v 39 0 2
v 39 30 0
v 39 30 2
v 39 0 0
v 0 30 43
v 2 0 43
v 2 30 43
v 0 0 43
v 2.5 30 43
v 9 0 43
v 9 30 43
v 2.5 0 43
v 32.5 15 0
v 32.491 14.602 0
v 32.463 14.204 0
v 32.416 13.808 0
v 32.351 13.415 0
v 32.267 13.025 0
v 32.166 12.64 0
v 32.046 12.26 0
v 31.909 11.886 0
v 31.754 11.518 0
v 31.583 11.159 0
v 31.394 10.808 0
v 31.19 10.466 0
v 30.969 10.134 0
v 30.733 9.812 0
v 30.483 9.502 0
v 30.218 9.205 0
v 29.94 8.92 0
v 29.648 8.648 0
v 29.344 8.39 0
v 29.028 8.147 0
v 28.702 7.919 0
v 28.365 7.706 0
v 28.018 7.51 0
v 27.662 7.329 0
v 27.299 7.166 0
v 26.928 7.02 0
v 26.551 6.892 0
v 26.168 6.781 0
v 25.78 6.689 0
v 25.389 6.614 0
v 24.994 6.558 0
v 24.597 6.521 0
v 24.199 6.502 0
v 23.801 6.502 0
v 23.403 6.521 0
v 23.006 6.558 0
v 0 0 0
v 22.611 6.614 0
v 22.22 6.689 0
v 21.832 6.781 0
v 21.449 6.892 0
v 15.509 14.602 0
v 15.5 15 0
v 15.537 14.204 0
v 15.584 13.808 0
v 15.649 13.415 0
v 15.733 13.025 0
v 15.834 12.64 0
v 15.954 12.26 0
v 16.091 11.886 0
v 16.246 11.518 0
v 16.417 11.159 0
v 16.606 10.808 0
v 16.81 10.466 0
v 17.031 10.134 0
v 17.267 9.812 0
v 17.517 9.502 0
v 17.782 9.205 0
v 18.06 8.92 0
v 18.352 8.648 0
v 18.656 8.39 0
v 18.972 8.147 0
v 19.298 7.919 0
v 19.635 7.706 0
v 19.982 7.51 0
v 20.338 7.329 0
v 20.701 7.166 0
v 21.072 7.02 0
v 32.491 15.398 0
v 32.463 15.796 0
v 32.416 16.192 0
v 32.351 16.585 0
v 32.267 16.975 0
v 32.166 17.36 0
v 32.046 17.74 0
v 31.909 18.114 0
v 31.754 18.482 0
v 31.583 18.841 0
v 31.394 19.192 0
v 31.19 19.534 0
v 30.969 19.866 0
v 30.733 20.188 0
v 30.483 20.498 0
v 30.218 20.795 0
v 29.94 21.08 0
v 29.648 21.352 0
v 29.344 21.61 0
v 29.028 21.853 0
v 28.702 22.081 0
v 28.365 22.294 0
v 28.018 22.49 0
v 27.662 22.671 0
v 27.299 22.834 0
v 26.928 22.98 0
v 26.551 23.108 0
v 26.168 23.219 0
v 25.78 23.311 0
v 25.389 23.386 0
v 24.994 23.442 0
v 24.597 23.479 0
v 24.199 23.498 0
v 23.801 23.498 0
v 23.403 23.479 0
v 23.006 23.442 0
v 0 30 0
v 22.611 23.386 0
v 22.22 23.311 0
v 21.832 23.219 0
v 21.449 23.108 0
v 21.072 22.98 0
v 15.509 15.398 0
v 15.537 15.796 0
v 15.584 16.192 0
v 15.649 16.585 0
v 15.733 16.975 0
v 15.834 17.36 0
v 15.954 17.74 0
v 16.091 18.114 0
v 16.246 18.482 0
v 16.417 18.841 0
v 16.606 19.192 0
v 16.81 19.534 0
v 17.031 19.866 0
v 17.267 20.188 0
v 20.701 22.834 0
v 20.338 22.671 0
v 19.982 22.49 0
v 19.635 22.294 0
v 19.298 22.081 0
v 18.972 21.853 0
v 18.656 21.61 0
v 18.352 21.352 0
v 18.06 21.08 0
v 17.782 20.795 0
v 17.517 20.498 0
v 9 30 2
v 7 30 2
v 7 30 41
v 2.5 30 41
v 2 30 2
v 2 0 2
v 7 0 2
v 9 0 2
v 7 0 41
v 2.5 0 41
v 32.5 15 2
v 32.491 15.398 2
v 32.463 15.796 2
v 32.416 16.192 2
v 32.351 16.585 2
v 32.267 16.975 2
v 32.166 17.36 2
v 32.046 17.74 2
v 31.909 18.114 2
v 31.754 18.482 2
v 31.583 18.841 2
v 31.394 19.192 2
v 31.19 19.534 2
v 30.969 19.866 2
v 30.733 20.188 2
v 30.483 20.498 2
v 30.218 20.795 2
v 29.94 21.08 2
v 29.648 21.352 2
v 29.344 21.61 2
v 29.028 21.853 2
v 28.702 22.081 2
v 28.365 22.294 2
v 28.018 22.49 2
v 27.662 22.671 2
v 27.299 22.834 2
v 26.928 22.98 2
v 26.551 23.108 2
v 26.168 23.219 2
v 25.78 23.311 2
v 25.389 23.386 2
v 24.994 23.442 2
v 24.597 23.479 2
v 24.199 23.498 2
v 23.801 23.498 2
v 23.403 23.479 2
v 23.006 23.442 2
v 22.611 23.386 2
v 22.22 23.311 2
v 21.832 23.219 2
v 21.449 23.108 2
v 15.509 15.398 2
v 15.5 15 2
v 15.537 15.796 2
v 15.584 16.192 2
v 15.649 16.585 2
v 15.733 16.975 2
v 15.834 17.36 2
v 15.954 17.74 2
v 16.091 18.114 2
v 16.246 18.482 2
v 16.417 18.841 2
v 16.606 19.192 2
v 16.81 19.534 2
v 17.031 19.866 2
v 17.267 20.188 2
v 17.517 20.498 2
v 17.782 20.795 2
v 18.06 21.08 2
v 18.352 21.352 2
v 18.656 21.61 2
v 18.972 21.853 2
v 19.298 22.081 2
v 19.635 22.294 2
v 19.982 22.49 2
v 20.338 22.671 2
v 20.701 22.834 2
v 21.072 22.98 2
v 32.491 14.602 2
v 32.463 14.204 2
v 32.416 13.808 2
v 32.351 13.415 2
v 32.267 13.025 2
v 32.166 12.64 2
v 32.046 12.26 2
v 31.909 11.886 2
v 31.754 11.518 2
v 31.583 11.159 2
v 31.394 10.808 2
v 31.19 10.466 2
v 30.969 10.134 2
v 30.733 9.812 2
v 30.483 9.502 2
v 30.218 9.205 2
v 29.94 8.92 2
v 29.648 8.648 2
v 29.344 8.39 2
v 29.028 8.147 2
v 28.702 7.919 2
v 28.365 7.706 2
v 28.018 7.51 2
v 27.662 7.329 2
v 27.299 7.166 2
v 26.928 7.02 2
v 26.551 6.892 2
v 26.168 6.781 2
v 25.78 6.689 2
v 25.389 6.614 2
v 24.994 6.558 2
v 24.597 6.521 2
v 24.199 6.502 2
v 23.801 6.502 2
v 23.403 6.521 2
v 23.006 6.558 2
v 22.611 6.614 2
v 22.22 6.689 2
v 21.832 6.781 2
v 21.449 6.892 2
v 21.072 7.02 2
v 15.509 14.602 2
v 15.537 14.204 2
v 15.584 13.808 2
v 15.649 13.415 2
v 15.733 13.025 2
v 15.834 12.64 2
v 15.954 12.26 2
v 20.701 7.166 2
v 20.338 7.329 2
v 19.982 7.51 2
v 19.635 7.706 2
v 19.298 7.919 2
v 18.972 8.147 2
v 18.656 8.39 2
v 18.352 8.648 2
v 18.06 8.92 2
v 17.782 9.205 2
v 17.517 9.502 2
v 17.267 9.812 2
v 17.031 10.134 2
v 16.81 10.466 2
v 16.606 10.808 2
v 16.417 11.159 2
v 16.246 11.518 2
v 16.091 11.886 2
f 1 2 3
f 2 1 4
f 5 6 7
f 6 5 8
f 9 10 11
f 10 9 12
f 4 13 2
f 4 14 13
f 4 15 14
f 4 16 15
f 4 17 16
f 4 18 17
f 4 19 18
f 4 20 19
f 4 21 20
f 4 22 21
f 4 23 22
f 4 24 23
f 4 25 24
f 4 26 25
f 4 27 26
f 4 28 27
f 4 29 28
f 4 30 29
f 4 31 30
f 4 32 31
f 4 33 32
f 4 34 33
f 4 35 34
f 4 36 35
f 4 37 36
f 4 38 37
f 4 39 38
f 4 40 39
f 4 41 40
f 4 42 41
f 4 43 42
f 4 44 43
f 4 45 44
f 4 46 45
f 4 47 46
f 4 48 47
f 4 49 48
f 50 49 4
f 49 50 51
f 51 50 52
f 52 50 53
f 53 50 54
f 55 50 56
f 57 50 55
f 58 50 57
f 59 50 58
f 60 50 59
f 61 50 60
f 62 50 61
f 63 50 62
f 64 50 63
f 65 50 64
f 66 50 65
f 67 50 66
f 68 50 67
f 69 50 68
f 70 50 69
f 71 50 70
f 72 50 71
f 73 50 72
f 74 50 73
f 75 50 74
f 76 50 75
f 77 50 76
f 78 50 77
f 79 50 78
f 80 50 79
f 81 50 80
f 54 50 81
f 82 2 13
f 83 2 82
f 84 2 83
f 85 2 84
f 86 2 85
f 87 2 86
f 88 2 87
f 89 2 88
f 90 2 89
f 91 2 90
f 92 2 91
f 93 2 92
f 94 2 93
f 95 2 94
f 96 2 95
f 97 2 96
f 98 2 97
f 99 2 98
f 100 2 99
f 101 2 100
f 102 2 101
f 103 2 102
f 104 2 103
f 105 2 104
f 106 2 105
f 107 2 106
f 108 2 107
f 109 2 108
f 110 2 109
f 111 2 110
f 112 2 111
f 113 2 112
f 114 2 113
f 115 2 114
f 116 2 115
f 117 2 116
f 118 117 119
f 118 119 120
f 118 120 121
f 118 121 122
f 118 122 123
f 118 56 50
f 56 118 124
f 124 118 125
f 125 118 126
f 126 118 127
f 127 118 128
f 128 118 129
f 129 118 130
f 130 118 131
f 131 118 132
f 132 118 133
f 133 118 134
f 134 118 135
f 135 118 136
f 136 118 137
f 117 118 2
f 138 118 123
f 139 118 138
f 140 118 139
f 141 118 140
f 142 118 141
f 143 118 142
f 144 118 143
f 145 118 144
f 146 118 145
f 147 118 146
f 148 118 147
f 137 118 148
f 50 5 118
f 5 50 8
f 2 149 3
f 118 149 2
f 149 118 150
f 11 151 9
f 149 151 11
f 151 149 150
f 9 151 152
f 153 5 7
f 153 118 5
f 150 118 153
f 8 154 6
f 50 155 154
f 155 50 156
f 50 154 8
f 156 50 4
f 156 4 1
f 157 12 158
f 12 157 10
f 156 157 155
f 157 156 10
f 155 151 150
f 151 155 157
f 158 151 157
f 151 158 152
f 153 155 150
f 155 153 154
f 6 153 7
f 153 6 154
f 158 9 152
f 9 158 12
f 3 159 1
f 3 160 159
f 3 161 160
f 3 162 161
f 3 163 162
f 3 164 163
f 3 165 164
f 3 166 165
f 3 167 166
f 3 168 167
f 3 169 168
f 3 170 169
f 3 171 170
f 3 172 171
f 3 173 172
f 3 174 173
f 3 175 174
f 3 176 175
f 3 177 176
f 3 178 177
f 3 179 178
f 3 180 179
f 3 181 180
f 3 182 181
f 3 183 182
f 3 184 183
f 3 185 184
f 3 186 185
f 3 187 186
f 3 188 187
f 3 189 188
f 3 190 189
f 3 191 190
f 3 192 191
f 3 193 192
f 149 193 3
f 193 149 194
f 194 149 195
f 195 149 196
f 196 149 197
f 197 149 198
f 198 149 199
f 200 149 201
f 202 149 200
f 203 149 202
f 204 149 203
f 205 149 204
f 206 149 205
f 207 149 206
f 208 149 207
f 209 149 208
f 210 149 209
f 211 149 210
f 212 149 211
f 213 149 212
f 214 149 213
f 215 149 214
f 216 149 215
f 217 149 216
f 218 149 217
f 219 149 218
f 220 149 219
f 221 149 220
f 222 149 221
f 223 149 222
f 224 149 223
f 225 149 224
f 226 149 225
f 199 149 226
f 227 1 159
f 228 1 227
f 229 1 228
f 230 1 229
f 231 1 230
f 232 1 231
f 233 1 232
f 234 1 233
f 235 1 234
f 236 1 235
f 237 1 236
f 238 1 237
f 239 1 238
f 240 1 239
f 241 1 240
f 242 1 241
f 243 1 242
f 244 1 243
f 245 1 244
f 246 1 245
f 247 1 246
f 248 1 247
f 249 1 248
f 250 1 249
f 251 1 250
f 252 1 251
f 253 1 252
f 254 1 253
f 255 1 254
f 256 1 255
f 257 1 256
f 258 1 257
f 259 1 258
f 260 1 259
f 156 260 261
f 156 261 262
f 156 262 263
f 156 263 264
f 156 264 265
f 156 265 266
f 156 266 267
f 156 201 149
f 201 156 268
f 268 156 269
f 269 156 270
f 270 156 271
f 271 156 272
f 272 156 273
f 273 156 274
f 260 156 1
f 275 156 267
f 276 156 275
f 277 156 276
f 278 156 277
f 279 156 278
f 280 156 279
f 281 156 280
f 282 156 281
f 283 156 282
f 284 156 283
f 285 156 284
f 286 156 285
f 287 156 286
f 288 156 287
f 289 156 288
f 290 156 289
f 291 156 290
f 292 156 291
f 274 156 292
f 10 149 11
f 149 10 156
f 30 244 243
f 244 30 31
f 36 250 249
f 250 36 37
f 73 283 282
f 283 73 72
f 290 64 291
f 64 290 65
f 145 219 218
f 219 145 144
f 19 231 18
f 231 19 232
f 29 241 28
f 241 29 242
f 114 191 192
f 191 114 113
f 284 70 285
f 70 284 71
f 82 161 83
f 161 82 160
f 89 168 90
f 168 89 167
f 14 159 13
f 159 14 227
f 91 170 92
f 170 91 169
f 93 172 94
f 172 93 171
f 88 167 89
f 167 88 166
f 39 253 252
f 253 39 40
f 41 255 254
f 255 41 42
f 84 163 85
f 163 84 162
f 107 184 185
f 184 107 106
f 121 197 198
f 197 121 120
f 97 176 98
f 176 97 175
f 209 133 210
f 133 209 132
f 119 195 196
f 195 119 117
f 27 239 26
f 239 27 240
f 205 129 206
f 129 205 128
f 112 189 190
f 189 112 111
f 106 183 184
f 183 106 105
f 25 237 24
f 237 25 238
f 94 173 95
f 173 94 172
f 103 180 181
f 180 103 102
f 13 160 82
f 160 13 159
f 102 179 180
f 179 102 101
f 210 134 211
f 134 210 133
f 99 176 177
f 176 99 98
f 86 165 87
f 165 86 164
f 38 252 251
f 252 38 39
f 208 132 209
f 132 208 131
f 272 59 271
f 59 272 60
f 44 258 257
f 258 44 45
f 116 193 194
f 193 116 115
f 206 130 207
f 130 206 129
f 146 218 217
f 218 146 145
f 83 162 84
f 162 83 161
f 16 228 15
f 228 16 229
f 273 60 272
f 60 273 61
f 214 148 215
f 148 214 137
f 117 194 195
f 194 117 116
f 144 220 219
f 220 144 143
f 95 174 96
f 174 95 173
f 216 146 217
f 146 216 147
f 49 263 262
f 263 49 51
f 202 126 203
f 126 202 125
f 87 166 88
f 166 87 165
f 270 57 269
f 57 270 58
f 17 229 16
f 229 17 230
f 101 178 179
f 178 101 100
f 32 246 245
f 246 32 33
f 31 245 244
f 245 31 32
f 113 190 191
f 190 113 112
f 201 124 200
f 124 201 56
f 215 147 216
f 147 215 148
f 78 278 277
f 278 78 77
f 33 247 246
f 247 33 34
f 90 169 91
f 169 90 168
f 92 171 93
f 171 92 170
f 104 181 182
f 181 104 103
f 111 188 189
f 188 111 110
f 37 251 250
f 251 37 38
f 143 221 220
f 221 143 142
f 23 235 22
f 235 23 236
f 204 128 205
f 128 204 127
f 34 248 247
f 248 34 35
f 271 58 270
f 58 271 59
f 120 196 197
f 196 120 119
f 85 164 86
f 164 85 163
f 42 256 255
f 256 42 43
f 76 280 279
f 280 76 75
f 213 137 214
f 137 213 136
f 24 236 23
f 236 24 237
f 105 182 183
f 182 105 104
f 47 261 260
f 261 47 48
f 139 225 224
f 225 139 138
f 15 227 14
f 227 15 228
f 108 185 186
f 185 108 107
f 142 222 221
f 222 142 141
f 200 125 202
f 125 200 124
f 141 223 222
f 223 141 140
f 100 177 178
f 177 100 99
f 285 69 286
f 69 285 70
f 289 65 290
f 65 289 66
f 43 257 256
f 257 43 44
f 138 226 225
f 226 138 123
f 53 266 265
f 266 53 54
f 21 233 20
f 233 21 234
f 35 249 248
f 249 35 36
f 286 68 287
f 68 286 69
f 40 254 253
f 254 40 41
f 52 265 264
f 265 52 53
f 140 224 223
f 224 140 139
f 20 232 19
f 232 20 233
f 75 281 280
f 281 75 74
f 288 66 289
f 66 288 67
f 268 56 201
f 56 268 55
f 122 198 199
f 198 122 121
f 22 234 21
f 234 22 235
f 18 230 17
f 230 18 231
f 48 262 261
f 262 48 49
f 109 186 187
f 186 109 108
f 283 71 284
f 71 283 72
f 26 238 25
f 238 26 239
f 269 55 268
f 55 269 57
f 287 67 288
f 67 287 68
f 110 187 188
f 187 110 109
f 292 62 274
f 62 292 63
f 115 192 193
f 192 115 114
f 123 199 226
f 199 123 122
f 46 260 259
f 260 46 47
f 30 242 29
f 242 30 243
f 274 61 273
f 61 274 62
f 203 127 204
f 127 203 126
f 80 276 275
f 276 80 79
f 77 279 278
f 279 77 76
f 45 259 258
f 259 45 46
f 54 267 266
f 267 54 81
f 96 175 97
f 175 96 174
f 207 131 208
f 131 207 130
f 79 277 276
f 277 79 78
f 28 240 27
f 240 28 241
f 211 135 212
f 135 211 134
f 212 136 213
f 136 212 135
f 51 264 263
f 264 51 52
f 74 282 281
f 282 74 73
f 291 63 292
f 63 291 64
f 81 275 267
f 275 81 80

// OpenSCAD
/*
Creator
*****************
Constantin Ganshin

Project name:
*****************
Tooth_brush_Holder_With_Clip

Description:
****************************************

With square toothbrush holder and a clip that intent to be on top of metal frame of the shampoo holder
Added a partially open bean on the buttom for batter hold on the rails

            -----------------|----------|----
            |         |            
            |         |
            |         |
            |         |
            |         |
            |         |
            |         |
            |         |
            |         |
            |         |
            |         |
            | ________| 

Printed in PETG (for water resistance)

*/

// Resolution variables
$fa = 1;
$fs = 0.4;

// Main dimension variables

hightZ = 43;
holderGapX = 5; //The place that will on top of the metal bar
toothbrushHolderLengthWidth = 30;
wallThikness = 2;
holeForToothbrushD = 17;
clip_opennig_gap_x = holderGapX - 4.5;
fullBodyLengthX = (wallThikness * 2) + holderGapX + toothbrushHolderLengthWidth;
holeForToothbrushR = holeForToothbrushD / 2;

// Main

module toothbrushHolderWithClip(){
    difference(){
        cube([fullBodyLengthX, toothbrushHolderLengthWidth, hightZ]);

        // Clip
        translate([wallThikness, -1, wallThikness])
            cube([holderGapX, toothbrushHolderLengthWidth * 2, hightZ - (wallThikness * 2)]);
        
        // Clip openning gap
        translate([wallThikness, -1, hightZ - (wallThikness * 2) -1])
            cube([clip_opennig_gap_x, toothbrushHolderLengthWidth + 2, (wallThikness * 2) + 2]);

        // Toothbrush holder
        translate([fullBodyLengthX - toothbrushHolderLengthWidth
    , -1, wallThikness])
            cube([toothbrushHolderLengthWidth * 2, toothbrushHolderLengthWidth * 2, hightZ * 2]);

        // Toothbrush holder hole
        translate([fullBodyLengthX - (toothbrushHolderLengthWidth / 2),toothbrushHolderLengthWidth / 2, -1])
            cylinder(r = holeForToothbrushR, h = wallThikness * 2);
    }
}

// Generate the toothbrush holder with clip
toothbrushHolderWithClip();
